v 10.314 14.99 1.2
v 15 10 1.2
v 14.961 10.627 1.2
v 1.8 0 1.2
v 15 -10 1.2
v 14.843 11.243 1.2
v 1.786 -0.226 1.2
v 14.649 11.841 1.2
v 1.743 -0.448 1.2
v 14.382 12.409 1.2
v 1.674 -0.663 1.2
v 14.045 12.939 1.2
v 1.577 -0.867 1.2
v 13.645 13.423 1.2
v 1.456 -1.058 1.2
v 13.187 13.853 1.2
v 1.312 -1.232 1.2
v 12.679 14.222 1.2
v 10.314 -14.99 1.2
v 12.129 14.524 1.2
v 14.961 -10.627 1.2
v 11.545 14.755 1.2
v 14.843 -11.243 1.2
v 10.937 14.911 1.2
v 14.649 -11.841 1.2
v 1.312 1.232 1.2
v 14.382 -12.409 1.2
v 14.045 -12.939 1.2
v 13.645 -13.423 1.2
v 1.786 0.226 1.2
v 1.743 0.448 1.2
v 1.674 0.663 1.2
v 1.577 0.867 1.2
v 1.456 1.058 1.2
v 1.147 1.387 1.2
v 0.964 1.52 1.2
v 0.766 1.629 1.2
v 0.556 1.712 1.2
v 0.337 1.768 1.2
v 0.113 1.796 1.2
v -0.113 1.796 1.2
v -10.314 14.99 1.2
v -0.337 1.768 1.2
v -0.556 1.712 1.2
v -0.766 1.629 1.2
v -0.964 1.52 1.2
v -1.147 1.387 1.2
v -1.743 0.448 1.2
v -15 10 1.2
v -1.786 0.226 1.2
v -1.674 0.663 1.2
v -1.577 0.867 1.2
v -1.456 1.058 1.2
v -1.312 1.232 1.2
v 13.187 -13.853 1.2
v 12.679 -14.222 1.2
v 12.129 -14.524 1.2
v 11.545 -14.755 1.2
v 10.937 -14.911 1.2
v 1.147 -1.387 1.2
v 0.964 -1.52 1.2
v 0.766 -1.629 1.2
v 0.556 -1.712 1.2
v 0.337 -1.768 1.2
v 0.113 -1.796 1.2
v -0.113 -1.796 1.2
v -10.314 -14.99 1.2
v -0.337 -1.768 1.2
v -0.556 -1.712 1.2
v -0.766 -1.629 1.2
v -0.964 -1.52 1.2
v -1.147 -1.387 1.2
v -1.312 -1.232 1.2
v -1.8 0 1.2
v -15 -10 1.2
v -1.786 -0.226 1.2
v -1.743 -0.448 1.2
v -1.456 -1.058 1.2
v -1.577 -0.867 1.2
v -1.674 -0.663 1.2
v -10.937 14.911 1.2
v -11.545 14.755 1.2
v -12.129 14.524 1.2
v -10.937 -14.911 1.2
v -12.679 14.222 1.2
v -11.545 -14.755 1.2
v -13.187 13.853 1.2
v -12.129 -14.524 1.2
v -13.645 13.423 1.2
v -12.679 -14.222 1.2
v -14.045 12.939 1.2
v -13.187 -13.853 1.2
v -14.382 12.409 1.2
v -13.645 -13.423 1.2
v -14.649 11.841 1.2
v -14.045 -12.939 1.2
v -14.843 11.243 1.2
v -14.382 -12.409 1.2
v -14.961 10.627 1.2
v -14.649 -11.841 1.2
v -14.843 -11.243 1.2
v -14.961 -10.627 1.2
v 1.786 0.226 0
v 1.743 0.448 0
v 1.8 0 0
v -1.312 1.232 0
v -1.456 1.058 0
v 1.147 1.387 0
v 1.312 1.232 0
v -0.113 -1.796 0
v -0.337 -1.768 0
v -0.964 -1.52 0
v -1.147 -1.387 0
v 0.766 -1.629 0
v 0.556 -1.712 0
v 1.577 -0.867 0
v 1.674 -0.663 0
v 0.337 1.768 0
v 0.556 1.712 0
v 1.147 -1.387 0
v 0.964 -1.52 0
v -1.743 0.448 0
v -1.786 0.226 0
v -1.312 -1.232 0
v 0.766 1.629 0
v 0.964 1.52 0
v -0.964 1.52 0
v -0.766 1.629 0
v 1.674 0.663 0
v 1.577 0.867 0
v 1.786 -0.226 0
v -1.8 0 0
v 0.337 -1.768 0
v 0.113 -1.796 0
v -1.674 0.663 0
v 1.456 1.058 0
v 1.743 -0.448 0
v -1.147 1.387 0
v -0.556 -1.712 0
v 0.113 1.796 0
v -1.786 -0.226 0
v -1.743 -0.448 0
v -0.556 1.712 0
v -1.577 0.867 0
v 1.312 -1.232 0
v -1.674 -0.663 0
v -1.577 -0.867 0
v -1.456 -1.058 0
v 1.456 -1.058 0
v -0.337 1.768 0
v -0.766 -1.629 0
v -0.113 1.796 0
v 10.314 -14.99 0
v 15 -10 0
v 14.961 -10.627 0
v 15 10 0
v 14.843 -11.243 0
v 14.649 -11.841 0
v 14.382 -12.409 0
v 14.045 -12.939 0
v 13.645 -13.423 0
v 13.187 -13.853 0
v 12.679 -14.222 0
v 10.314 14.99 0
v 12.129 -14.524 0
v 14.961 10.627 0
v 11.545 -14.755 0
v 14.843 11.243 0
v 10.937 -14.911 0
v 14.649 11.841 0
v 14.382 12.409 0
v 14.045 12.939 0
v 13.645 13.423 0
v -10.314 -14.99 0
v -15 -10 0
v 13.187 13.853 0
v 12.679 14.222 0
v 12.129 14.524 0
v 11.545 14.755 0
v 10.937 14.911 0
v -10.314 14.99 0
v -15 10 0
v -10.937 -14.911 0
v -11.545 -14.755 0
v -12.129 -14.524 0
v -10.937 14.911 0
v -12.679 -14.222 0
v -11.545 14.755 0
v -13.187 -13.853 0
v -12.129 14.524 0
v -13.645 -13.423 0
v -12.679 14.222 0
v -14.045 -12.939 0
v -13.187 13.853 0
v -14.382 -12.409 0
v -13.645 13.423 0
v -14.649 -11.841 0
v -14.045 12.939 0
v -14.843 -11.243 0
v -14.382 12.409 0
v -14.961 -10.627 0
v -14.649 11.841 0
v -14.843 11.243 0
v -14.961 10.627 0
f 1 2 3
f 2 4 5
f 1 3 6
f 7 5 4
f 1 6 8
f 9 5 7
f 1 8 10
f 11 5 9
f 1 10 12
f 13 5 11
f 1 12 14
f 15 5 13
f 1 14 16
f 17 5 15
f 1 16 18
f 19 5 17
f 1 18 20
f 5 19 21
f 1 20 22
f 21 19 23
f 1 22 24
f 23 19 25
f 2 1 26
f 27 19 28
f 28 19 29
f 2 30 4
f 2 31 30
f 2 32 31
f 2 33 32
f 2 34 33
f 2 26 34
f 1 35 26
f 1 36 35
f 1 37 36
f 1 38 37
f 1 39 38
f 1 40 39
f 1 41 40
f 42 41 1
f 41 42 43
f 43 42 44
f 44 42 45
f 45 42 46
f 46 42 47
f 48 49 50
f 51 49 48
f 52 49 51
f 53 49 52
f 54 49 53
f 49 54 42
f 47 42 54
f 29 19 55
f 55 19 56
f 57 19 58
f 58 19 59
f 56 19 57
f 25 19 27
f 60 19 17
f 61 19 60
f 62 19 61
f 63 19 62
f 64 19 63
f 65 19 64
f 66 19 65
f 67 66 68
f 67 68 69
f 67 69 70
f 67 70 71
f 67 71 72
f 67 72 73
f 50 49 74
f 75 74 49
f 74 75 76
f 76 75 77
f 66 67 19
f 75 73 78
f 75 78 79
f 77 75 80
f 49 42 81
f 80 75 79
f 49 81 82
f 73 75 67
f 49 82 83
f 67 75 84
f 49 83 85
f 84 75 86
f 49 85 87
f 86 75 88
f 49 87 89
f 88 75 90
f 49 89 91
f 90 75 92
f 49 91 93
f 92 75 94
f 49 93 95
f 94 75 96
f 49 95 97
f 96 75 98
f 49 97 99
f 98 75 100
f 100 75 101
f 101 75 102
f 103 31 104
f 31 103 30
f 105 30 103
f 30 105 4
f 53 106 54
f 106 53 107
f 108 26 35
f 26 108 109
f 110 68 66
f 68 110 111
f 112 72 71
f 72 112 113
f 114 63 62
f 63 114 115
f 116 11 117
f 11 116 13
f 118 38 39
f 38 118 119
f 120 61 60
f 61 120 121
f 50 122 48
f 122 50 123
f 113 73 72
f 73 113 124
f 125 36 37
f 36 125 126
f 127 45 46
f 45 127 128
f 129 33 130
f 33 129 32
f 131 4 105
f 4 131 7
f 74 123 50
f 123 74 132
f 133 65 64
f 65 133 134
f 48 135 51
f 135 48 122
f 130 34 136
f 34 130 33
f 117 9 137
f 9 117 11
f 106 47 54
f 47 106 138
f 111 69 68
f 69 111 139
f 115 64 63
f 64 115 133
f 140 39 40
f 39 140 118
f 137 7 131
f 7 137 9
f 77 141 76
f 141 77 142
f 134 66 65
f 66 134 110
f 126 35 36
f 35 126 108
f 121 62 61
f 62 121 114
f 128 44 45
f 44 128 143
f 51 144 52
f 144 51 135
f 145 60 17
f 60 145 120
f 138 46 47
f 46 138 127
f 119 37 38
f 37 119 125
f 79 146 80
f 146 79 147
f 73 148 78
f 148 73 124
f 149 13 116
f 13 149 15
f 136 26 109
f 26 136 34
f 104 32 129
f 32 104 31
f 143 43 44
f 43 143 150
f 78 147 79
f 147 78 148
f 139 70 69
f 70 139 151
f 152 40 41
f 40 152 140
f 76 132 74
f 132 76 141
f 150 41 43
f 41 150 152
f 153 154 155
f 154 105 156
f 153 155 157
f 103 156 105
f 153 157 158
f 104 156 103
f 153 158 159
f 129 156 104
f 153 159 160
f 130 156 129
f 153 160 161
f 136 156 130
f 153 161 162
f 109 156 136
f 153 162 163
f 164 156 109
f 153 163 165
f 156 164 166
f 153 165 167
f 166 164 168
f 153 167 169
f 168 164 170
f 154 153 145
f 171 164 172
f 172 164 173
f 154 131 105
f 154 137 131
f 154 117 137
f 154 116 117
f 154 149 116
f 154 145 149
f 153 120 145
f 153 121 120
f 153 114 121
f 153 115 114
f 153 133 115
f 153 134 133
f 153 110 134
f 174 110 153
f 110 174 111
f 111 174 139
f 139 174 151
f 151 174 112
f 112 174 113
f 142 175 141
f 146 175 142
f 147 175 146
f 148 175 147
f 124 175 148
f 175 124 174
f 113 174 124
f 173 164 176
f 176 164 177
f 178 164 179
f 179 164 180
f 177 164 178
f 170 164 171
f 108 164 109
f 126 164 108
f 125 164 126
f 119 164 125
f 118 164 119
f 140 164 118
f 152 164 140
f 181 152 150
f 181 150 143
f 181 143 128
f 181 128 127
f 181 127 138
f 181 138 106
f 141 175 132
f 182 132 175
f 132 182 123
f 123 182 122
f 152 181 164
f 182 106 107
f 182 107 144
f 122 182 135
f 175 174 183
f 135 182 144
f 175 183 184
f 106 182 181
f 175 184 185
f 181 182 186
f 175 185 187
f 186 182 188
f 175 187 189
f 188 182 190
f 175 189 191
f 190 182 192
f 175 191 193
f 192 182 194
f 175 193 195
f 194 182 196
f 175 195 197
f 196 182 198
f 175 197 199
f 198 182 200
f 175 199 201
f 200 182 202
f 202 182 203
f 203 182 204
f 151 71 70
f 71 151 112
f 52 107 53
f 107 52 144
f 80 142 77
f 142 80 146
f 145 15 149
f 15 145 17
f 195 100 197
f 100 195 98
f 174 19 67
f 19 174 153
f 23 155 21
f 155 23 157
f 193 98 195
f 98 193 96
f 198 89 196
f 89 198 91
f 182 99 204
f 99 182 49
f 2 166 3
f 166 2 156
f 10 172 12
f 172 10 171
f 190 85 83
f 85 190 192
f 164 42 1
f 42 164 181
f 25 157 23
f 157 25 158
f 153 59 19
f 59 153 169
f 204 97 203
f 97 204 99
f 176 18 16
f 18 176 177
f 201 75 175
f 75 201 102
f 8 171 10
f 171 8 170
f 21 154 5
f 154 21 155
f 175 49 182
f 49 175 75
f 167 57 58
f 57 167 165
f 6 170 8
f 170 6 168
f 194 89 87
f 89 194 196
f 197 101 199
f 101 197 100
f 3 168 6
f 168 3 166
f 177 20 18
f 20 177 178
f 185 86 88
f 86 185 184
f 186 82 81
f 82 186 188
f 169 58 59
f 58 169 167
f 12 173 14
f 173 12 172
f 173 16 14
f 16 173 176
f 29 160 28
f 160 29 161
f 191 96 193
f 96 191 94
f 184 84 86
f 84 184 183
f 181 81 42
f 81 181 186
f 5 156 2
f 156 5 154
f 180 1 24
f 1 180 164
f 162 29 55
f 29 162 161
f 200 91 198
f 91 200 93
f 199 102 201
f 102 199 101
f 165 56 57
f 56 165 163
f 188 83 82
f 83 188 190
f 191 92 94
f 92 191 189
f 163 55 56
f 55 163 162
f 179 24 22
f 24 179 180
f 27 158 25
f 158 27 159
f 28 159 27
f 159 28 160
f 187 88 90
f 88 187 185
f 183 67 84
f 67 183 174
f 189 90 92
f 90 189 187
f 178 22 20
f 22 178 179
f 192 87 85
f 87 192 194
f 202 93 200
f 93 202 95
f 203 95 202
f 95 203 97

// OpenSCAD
$fn = 50;


difference() {
	union() {
		hull() {
			translate(v = [-10.0000000000, 10.0000000000, 0]) {
				cylinder(h = 45, r = 5);
			}
			translate(v = [10.0000000000, 10.0000000000, 0]) {
				cylinder(h = 45, r = 5);
			}
			translate(v = [-10.0000000000, -10.0000000000, 0]) {
				cylinder(h = 45, r = 5);
			}
			translate(v = [10.0000000000, -10.0000000000, 0]) {
				cylinder(h = 45, r = 5);
			}
		}
	}
	union() {
		translate(v = [0, 0, 1.2000000000]) {
			hull() {
				translate(v = [-10.0000000000, 10.0000000000, 0]) {
					cylinder(h = 43.8000000000, r = 3.8000000000);
				}
				translate(v = [10.0000000000, 10.0000000000, 0]) {
					cylinder(h = 43.8000000000, r = 3.8000000000);
				}
				translate(v = [-10.0000000000, -10.0000000000, 0]) {
					cylinder(h = 43.8000000000, r = 3.8000000000);
				}
				translate(v = [10.0000000000, -10.0000000000, 0]) {
					cylinder(h = 43.8000000000, r = 3.8000000000);
				}
			}
		}
		#cylinder(h = 1.2000000000, r = 1.8000000000);
		translate(v = [-250.0000000000, -250.0000000000, 1.2000000000]) {
			cube(size = [500, 500, 500]);
		}
		translate(v = [-250.0000000000, -250.0000000000, 1.2000000000]) {
			cube(size = [500, 500, 500]);
		}
		translate(v = [-250.0000000000, -250.0000000000, 1.2000000000]) {
			cube(size = [500, 500, 500]);
		}
	}
}
